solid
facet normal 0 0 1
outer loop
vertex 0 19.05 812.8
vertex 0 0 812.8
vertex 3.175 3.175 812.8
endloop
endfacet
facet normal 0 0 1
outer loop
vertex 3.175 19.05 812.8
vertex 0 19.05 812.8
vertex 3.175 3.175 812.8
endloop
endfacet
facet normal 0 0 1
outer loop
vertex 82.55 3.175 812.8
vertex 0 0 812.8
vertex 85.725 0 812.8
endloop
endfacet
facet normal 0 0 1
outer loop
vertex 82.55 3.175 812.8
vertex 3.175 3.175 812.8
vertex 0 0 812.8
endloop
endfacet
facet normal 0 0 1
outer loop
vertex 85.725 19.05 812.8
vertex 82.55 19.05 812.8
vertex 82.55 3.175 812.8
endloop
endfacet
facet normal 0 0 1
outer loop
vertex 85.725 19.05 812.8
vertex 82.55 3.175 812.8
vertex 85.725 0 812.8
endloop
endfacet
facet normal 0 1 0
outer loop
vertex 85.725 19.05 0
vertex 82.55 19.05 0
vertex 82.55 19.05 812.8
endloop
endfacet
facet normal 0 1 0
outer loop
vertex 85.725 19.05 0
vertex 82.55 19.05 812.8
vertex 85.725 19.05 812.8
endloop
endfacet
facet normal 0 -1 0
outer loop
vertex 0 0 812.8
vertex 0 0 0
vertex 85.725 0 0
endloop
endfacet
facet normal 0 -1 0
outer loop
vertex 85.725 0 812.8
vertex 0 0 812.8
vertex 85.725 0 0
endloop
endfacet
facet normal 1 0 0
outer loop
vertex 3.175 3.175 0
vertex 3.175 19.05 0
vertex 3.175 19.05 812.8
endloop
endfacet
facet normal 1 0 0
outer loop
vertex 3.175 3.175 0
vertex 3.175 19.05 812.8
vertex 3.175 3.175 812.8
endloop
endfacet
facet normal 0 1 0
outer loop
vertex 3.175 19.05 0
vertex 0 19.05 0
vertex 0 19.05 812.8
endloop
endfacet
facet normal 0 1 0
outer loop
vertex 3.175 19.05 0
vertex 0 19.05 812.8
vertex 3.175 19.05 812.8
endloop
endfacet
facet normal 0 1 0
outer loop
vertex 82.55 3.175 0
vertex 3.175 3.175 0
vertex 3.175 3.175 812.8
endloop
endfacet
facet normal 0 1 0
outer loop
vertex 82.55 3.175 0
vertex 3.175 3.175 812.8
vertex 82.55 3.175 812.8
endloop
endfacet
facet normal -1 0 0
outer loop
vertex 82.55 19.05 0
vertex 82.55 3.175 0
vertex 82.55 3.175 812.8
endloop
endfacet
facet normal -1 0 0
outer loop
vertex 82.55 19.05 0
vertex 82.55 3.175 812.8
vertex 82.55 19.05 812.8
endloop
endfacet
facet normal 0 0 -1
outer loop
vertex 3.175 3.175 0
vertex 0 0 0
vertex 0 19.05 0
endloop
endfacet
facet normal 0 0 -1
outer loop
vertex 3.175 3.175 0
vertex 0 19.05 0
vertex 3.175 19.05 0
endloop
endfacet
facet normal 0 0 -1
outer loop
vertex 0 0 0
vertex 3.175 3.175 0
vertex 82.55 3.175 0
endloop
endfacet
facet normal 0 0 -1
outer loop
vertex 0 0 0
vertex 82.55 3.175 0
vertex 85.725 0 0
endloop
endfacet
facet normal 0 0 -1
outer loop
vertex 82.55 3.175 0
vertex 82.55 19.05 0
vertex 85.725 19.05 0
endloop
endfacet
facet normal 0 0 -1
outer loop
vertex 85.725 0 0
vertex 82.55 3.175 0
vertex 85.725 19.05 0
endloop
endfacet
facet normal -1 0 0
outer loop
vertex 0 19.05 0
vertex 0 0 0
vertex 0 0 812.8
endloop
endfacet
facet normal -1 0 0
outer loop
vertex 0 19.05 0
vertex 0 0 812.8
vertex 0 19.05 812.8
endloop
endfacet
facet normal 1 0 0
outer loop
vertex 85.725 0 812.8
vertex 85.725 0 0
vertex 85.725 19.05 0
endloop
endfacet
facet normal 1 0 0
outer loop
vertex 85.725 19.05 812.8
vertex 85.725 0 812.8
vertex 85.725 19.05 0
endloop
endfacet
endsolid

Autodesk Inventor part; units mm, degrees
ref_plane "YZ Plane" through (0, 0, 0) normal (1, 0, 0) x (0, 1, 0)
ref_plane "XZ Plane" through (0, 0, 0) normal (0, 1, 0) x (-1, 0, 0)
ref_plane "XY Plane" through (0, 0, 0) normal (0, 0, 1) x (1, 0, 0)
sketch "Sketch1" plane through (0, 0, 0) normal (0, 0, 1) x (1, 0, 0)
  line L0 (0, 0) -> (0, 19.05)
  line L1 (0, 19.05) -> (3.175, 19.05)
  line L2 (3.175, 19.05) -> (3.175, 3.175)
  line L3 (3.175, 3.175) -> (82.55, 3.175)
  line L4 (0, 0) -> (85.725, 0)
  line L5 (0, 0) -> (85.725, 0) construction
  line L6 (85.725, 0) -> (85.725, 19.05)
  line L7 (82.55, 3.175) -> (82.55, 19.05)
  line L8 (82.55, 19.05) -> (85.725, 19.05)
  dimension "d7" = 19.05
  dimension "d8" = 3.175
  dimension "d9" = 15.875
  dimension "d10" = 79.375
  dimension "d11" = 90
  dimension "d12" = 85.725
  dimension "d13" = 0
  dimension "d14" = 19.05
extrude "Extrusion1" add sketch "Sketch1" along normal blind 812.8
properties part number "FrameSide"
